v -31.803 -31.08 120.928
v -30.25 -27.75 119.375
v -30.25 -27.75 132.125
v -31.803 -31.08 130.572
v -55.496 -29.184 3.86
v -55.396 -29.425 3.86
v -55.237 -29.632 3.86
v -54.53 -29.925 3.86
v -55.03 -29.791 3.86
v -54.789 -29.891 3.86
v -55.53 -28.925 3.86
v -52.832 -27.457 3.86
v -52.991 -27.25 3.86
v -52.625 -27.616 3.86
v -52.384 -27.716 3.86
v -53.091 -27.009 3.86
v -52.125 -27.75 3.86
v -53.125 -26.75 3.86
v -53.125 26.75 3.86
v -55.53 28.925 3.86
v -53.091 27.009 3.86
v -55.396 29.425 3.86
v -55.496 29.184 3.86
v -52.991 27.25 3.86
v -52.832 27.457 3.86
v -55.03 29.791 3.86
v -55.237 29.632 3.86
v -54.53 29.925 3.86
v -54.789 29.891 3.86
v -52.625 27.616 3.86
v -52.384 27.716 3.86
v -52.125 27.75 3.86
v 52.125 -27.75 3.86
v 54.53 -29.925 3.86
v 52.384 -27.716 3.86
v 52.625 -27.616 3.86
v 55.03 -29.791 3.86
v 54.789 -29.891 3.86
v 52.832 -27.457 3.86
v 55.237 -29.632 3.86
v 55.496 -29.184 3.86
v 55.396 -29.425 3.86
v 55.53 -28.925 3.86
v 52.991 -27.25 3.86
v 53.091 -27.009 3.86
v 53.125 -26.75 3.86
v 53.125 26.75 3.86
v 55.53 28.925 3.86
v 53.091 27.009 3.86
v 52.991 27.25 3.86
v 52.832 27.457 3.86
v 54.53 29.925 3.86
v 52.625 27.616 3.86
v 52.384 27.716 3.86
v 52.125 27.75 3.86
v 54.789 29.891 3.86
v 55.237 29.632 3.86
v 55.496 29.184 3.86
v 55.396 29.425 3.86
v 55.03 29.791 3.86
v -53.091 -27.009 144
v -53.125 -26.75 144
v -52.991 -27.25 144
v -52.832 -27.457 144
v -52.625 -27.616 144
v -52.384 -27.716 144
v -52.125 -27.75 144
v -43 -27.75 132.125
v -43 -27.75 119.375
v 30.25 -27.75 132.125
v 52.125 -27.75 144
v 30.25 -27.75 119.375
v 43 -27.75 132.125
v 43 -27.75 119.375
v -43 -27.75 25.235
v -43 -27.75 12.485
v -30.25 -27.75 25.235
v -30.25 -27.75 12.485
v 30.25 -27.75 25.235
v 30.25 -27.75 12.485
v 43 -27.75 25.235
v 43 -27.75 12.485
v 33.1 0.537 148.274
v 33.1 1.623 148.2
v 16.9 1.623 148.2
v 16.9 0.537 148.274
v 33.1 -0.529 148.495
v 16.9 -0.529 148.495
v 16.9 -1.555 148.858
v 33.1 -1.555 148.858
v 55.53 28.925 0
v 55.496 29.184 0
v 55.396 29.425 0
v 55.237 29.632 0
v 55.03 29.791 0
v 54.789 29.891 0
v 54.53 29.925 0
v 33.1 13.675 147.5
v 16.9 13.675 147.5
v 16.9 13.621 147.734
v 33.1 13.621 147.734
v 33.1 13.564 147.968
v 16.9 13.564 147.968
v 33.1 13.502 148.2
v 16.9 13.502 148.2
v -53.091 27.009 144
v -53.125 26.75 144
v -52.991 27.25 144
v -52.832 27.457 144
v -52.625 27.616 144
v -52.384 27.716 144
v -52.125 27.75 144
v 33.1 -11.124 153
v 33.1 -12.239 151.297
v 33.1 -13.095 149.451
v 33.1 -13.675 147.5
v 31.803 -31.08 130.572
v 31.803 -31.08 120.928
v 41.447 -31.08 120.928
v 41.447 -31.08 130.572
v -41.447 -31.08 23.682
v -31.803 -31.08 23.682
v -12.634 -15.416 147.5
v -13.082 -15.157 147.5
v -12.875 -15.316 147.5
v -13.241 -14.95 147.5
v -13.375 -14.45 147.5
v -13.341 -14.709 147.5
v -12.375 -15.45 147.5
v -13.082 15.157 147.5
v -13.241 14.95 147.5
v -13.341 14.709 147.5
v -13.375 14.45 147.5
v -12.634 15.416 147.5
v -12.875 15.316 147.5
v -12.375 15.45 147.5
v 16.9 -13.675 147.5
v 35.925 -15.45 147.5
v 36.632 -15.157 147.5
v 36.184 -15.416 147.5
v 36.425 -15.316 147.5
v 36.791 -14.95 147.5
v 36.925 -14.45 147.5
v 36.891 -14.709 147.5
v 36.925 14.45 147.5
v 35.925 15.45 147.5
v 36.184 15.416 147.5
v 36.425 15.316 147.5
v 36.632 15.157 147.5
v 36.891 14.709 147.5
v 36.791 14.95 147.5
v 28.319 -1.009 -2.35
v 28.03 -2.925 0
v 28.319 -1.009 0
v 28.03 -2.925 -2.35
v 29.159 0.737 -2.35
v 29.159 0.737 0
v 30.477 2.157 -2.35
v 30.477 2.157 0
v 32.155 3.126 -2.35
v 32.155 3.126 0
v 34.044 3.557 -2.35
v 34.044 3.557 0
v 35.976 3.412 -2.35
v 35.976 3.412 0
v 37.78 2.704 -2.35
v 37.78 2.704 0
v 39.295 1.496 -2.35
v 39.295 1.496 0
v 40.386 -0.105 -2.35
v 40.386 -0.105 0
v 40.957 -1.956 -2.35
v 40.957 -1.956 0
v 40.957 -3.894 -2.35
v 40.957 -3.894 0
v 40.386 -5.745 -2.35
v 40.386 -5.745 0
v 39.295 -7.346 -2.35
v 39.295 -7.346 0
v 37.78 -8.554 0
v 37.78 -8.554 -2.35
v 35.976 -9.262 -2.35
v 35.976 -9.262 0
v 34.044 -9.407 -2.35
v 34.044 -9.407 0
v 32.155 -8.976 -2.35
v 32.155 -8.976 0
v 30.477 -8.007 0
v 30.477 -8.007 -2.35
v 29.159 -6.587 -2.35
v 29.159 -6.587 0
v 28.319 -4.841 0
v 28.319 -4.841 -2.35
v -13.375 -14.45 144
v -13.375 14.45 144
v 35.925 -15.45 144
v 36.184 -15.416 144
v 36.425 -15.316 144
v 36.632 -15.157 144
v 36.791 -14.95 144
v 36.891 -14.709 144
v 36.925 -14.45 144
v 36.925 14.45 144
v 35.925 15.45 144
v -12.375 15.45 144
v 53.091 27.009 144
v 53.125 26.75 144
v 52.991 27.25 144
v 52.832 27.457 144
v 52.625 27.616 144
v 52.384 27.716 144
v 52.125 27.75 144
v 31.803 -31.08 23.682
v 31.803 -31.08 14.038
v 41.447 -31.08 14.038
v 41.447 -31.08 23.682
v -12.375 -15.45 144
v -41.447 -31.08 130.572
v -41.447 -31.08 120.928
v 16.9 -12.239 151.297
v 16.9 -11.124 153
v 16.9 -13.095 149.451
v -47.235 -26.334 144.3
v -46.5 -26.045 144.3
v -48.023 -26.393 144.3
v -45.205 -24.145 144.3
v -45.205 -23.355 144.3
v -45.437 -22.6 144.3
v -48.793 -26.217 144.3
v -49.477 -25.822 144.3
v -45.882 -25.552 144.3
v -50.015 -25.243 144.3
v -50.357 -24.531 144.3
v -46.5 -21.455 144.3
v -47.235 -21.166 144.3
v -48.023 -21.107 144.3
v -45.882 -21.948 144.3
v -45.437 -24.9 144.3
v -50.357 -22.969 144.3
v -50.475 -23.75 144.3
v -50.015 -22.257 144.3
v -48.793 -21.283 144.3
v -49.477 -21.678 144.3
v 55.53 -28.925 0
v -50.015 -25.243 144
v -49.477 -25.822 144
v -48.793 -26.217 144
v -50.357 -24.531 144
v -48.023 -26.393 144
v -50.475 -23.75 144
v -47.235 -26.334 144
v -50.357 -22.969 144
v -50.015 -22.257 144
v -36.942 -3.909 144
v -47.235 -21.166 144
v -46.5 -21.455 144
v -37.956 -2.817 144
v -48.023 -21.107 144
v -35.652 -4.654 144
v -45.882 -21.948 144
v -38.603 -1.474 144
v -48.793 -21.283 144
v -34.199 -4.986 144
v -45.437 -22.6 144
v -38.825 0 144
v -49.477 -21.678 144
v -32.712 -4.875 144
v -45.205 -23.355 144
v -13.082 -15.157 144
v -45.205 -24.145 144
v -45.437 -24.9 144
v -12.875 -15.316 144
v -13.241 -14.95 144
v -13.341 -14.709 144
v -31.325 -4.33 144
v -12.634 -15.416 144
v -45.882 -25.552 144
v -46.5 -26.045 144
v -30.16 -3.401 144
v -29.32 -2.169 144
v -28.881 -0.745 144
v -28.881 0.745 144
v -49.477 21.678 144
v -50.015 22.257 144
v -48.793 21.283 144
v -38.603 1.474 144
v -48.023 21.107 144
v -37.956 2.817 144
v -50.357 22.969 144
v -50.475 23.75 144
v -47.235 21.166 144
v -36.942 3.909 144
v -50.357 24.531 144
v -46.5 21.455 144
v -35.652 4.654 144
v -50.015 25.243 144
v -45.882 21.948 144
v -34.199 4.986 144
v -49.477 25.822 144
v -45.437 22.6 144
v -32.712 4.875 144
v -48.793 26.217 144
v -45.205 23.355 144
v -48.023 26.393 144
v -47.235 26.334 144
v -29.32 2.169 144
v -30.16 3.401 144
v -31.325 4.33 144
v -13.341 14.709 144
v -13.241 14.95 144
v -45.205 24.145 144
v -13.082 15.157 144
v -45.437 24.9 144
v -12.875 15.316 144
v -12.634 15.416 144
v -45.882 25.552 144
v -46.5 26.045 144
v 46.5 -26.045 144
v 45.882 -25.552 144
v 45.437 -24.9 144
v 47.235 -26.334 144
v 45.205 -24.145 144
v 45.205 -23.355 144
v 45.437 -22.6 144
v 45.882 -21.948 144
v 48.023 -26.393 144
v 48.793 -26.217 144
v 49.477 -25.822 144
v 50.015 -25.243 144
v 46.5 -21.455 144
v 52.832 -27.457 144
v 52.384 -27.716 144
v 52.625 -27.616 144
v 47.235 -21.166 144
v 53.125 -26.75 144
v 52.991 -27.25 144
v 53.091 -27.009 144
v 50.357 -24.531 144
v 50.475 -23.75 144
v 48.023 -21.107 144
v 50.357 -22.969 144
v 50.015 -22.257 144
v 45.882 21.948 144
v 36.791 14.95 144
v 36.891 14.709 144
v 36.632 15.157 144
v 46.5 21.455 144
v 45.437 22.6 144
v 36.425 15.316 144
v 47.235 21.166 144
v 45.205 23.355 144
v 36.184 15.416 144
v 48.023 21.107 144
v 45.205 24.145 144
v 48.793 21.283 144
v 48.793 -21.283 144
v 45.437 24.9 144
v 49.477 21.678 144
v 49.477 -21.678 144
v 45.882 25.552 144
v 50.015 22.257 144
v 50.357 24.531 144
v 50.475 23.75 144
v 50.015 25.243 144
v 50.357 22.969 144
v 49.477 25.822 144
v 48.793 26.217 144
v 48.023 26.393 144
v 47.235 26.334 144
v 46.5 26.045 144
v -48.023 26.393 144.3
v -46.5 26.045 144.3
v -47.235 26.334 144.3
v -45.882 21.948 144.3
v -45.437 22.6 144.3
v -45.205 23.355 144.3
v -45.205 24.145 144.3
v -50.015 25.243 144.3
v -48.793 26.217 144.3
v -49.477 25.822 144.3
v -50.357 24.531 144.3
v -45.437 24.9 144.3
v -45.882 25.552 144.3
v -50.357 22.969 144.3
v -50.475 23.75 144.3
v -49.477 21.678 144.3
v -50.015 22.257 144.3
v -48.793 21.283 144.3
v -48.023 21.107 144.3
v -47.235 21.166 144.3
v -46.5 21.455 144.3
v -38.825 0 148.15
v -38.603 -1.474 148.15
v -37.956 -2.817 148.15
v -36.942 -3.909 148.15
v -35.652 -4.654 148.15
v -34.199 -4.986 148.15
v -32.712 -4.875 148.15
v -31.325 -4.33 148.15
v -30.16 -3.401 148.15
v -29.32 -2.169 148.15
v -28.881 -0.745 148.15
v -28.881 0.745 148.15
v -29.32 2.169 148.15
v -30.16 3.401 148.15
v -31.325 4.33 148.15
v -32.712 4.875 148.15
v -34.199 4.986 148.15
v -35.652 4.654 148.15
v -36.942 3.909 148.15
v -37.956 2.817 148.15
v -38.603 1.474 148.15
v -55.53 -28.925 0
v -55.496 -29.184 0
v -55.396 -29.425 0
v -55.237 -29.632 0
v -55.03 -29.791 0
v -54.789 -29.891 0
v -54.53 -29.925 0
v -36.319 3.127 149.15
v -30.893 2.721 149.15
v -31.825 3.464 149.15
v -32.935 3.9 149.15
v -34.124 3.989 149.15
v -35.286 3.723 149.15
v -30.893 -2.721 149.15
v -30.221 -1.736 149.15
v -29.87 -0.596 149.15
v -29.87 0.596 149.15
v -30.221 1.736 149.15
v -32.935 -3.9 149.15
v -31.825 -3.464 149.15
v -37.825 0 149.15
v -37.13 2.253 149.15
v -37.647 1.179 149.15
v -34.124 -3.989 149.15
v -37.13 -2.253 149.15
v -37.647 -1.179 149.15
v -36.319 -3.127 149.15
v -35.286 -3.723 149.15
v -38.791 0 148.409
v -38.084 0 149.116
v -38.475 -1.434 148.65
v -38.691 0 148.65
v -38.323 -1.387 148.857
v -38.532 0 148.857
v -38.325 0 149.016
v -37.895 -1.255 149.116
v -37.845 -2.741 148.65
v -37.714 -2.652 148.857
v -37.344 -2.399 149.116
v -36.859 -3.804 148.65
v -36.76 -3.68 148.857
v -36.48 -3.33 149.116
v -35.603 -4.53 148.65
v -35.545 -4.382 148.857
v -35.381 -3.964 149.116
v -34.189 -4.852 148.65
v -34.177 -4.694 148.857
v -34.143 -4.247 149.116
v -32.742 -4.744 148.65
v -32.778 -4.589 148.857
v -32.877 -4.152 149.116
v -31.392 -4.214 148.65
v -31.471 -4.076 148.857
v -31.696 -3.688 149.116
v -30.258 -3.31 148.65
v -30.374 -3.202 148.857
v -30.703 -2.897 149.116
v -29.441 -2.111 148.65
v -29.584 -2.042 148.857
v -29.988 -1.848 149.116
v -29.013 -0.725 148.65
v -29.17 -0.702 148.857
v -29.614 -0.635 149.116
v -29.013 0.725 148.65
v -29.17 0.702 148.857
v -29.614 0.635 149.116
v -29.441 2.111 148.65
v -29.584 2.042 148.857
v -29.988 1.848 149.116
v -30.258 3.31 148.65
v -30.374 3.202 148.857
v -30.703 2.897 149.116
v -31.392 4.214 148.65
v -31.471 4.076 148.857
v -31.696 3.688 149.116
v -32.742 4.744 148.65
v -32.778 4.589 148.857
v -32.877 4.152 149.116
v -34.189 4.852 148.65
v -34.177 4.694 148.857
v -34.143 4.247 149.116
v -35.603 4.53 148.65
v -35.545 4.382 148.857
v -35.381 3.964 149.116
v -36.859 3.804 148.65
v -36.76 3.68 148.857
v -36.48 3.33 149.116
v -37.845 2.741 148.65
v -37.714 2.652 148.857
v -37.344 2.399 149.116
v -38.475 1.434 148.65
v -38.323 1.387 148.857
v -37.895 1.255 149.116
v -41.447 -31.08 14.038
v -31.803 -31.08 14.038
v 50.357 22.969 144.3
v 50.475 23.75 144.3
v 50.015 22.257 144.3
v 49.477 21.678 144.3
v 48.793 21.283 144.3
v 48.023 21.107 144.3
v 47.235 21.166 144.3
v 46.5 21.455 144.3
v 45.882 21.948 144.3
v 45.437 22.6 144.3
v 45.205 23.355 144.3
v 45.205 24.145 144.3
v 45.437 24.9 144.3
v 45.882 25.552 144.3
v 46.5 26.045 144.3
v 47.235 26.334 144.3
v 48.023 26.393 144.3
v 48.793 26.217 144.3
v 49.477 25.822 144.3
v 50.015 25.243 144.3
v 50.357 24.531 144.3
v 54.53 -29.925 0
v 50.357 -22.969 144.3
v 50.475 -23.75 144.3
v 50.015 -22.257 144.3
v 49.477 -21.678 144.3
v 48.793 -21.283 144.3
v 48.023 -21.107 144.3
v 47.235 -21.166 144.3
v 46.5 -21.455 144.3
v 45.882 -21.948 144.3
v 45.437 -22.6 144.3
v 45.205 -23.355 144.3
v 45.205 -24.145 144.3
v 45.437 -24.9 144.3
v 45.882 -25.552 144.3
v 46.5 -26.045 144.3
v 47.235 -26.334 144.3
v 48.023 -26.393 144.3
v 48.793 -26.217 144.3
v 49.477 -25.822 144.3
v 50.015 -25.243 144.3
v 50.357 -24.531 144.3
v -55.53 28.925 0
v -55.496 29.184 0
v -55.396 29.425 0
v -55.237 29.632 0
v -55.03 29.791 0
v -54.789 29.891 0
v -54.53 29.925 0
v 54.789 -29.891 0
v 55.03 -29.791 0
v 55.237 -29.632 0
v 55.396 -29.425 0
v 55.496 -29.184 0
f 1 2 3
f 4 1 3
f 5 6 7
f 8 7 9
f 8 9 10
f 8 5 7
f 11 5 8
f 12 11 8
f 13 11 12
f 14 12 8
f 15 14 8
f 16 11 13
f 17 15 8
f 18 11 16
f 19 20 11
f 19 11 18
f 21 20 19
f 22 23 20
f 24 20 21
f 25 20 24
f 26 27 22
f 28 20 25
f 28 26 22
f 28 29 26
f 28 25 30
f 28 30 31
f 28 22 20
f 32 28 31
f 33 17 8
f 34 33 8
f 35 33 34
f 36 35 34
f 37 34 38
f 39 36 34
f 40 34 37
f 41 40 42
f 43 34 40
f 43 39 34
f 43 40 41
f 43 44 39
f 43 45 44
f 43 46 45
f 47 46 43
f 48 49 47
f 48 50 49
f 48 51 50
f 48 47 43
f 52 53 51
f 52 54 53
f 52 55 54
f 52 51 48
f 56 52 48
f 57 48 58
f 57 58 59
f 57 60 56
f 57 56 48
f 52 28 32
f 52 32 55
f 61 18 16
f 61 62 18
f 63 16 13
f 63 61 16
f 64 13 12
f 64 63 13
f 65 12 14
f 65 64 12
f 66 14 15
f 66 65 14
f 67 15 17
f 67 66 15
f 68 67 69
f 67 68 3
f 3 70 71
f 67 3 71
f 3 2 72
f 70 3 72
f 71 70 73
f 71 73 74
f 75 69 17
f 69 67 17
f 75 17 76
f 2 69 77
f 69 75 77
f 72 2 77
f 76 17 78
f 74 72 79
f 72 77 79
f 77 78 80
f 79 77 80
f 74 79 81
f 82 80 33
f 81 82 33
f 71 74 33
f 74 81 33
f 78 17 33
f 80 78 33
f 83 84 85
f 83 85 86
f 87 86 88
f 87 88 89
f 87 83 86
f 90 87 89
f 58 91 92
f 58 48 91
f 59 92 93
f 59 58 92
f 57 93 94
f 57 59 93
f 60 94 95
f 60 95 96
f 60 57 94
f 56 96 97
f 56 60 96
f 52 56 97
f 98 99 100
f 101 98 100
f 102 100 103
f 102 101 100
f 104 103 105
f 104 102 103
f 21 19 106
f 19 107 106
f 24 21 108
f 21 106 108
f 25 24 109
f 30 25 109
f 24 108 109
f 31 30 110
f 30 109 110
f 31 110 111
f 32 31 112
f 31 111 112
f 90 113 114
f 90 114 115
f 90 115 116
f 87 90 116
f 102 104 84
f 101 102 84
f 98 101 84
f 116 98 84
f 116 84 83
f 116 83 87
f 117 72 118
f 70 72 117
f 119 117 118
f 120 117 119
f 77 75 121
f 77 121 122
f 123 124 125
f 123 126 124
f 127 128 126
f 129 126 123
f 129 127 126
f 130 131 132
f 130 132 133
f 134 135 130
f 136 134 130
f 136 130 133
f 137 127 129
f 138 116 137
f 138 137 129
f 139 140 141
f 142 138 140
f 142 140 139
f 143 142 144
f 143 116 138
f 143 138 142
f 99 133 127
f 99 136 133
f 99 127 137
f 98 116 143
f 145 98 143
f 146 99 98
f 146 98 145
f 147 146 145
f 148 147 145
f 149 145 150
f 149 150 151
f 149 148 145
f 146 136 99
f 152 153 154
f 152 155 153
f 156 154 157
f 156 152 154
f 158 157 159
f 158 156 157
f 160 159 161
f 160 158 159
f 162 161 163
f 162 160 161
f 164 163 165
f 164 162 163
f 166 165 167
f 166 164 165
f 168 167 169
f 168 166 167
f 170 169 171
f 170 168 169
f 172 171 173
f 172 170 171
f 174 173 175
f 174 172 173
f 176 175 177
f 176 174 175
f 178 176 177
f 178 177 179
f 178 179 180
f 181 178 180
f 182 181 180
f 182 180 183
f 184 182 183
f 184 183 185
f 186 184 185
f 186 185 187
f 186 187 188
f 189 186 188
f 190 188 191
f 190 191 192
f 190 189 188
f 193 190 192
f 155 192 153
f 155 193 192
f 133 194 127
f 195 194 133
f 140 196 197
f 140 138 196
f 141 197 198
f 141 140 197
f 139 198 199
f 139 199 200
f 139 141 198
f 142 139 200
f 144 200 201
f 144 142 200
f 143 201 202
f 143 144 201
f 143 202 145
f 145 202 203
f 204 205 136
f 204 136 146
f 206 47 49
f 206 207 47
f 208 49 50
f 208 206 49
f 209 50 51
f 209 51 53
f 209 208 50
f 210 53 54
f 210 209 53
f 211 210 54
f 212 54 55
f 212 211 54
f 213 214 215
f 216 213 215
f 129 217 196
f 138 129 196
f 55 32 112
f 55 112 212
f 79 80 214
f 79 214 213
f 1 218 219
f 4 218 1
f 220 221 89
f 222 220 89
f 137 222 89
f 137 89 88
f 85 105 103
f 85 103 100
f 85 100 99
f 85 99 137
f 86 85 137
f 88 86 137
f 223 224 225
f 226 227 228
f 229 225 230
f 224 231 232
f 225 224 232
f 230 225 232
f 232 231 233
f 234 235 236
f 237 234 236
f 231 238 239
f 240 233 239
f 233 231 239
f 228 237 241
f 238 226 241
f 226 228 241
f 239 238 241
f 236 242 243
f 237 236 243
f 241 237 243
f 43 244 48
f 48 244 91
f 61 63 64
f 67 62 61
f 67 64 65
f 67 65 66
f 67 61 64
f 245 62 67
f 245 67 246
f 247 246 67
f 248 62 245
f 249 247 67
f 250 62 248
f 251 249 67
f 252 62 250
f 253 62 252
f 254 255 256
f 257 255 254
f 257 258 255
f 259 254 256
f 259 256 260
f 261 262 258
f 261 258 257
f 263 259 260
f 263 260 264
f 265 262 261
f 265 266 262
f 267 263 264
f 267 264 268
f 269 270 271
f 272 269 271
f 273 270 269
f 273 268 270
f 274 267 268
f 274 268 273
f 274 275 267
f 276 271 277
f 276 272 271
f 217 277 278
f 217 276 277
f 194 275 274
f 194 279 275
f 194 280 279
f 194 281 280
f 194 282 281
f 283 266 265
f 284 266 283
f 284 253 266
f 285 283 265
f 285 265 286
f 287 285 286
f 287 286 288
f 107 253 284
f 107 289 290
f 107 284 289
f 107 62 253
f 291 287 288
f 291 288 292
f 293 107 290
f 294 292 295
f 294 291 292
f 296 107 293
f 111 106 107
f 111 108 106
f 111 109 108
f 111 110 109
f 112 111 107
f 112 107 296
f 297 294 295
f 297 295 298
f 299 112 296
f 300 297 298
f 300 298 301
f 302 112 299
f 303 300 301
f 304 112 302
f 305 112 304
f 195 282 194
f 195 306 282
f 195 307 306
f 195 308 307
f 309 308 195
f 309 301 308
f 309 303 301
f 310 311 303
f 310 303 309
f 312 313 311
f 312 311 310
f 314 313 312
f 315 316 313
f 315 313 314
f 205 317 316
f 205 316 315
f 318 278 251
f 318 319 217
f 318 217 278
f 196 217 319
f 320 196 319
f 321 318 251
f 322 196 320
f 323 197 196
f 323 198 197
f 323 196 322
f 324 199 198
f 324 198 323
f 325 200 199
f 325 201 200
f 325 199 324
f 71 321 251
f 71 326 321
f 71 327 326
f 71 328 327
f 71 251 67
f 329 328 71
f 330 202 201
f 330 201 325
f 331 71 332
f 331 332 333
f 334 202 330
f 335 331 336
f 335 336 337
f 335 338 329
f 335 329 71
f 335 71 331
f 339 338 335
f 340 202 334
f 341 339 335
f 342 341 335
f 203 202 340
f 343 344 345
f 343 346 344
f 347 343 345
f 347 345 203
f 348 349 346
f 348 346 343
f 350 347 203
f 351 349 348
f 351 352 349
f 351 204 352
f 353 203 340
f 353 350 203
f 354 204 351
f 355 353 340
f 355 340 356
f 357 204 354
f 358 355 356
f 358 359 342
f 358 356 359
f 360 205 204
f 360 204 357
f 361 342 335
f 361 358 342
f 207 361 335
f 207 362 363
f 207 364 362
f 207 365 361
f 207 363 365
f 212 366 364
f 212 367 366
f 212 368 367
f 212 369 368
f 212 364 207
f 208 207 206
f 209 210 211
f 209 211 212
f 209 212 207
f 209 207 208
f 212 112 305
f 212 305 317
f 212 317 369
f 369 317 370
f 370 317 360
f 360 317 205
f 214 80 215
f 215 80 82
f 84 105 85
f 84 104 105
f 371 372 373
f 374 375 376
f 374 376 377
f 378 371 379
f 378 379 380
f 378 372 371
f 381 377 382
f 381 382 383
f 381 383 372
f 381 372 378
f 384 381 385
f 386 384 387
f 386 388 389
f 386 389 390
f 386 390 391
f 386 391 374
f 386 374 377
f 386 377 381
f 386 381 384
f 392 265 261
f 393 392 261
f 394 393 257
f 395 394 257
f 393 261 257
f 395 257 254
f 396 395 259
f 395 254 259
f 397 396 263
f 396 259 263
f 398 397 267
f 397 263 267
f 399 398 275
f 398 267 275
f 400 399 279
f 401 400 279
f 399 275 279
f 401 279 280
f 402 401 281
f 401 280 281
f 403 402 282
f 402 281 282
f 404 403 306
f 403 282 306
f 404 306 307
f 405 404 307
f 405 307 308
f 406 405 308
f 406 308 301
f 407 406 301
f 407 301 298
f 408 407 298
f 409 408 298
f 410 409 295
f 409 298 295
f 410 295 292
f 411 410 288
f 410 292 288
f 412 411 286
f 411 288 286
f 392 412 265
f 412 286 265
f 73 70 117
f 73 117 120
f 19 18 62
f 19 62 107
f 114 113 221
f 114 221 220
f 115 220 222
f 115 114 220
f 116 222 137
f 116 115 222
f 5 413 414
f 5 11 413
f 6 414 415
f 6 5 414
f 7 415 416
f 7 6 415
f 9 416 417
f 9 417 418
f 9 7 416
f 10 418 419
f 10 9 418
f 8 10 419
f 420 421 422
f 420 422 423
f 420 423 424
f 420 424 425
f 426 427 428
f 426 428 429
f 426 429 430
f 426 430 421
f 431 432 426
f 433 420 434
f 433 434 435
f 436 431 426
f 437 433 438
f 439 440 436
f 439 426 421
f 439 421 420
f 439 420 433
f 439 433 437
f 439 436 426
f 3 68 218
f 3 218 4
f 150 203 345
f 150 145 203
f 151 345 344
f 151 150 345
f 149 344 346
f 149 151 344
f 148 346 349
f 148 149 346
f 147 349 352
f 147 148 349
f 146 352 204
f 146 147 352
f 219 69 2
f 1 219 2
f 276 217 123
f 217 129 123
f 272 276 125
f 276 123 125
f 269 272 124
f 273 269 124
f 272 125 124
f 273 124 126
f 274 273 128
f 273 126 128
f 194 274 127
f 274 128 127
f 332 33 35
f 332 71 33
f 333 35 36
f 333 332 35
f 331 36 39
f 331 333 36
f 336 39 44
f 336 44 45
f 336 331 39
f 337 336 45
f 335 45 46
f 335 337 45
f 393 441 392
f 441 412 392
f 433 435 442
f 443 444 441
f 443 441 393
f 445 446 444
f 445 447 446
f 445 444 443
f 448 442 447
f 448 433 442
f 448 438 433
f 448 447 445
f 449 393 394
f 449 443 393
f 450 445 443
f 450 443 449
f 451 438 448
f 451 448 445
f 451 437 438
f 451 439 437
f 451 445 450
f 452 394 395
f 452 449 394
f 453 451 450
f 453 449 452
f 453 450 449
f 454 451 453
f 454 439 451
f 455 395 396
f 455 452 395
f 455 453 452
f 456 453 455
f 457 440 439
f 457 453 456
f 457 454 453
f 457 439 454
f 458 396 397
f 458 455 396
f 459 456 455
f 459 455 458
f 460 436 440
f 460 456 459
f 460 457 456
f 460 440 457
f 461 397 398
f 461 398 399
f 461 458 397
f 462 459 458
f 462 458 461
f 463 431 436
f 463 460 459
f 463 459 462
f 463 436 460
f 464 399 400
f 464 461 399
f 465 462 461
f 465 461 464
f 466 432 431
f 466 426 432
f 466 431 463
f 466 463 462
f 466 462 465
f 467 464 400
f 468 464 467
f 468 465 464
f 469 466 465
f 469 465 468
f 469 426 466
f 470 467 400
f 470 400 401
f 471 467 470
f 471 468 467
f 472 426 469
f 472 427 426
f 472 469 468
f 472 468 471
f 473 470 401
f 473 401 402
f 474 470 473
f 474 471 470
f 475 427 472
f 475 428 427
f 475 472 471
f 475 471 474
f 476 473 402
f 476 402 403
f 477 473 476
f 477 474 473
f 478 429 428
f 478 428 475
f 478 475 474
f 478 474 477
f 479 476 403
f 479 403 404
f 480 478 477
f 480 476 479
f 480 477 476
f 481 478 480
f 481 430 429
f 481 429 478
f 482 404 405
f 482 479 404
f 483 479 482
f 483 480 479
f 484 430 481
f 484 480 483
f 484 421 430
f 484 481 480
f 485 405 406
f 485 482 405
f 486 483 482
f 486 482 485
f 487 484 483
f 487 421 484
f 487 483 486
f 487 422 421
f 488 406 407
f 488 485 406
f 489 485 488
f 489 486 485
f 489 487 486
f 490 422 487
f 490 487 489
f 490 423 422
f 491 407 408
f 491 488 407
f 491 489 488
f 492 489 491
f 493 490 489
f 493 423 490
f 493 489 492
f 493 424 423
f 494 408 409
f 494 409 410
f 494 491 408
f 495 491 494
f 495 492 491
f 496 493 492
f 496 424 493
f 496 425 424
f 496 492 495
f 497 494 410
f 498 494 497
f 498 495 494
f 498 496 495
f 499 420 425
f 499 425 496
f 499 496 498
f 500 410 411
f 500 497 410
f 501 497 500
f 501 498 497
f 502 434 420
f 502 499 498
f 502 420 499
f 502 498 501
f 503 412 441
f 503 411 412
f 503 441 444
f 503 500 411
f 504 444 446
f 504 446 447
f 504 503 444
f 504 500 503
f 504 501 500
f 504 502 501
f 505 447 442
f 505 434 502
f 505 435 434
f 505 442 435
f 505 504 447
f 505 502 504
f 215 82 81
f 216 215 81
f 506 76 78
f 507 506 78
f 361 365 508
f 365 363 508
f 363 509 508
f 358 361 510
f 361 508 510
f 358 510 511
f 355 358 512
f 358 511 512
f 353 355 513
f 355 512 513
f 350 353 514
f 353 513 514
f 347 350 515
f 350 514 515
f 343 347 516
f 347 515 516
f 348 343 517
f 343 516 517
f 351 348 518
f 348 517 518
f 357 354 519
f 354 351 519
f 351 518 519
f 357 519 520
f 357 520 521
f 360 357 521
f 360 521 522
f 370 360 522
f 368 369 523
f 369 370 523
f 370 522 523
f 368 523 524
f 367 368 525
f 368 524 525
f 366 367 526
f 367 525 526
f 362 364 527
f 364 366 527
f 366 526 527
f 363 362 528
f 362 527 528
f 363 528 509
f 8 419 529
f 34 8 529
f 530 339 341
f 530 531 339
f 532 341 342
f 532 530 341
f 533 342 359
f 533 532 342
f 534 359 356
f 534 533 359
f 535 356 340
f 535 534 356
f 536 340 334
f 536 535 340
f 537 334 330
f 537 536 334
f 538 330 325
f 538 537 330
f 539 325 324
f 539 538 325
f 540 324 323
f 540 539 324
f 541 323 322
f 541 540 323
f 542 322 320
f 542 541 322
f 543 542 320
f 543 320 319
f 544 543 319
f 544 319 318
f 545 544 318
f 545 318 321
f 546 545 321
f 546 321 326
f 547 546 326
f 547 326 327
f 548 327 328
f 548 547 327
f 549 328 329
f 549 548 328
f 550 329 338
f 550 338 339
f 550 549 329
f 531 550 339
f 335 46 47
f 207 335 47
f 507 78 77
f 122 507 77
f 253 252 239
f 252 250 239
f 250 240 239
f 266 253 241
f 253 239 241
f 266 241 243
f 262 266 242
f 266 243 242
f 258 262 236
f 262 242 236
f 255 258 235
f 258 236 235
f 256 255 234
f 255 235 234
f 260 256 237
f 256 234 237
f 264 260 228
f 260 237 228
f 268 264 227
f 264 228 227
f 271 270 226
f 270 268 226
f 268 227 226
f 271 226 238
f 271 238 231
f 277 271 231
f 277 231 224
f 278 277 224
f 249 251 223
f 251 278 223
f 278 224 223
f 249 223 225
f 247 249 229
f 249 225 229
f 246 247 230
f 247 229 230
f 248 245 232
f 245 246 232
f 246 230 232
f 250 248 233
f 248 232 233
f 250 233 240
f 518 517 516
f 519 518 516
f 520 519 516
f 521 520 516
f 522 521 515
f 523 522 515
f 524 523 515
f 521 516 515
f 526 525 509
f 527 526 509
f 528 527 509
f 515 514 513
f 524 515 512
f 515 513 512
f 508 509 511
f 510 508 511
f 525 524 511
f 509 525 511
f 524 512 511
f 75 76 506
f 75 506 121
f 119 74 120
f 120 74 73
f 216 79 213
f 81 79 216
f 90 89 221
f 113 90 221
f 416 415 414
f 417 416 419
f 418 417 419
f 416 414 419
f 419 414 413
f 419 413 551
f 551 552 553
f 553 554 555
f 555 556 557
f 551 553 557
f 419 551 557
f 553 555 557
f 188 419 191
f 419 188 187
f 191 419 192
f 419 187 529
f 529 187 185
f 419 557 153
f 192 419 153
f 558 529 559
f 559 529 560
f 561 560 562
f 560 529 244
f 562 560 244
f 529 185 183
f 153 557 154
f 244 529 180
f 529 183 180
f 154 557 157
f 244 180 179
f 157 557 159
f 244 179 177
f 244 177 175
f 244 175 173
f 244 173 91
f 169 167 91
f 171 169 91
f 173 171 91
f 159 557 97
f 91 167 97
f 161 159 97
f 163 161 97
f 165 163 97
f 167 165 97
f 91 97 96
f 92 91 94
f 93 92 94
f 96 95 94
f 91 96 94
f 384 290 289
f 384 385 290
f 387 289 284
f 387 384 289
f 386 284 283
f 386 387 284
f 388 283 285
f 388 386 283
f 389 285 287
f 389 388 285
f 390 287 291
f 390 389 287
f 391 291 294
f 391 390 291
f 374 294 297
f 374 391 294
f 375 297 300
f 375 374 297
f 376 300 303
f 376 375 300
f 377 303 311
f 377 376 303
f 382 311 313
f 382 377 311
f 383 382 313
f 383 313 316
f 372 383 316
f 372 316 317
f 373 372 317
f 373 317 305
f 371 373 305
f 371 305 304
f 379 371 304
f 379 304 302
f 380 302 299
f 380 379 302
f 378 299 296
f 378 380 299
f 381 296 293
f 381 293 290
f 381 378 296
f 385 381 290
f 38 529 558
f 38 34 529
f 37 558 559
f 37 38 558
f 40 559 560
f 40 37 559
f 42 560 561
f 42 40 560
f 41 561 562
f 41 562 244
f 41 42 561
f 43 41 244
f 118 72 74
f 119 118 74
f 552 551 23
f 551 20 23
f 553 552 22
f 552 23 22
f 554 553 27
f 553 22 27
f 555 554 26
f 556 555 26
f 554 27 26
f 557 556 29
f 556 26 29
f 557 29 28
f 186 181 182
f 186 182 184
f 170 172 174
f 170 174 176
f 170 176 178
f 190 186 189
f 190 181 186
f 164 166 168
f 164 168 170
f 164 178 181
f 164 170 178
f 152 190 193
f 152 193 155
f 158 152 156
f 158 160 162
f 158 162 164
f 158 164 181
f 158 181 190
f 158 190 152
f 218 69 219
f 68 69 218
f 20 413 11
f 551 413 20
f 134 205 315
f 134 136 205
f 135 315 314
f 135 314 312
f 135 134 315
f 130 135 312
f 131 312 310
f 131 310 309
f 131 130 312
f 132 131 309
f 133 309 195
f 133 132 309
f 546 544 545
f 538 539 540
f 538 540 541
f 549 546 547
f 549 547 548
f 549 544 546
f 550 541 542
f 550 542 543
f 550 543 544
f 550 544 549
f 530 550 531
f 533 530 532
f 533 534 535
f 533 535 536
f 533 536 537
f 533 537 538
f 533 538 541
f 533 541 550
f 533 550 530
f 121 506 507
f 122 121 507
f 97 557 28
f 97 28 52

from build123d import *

# Parameters (mm, degrees)
SKETCH1_W               = 111.06
SKETCH1_H               = 59.85
FACE_2_DEPTH            = 3.86
FACE_FILLETS_R          = 1
SKETCH2_W               = 106.25
SKETCH2_H               = 55.5
BODY_DEPTH              = 144
SKETCH3_W               = 12.75
SKETCH3_H               = 12.75
FEET_DEPTH              = 3.33
FEET_DRAFT              = 25
FEET_PROFILE_2_DEPTH    = 3.33
FEET_PROFILE_2_DRAFT    = 25
FEET_PROFILE_3_DEPTH    = 3.33
FEET_PROFILE_3_DRAFT    = 25
FEET_PROFILE_4_DEPTH    = 3.33
FEET_PROFILE_4_DRAFT    = 25
BODY_FILLETS_R          = 1
SKETCH4_R               = 5
GND_BANNANA_PORT_DEPTH  = 5.15
FILLET3_R               = 1
SKETCH5_W               = 50.3
SKETCH5_H               = 30.9
POWER_PORT_DEPTH        = 3.5
FILLET4_R               = 1
BOSS_EXTRUDE6_DEPTH     = 8.1
SKETCH7_R               = 6.5
BOSS_EXTRUDE7_DEPTH     = 2.35
SKETCH8_R               = 2.65
BOSS_EXTRUDE8_DEPTH     = 0.3
MIRROR2_COPY_1_SKETCH_R = 2.65
MIRROR2_COPY_1_DEPTH    = 0.3


with BuildPart() as part:
    # Sketch1 → Face 2 (new body)
    with BuildSketch(Plane.XY):
        Rectangle(SKETCH1_W, SKETCH1_H)
    extrude(amount=FACE_2_DEPTH)

    # Face Fillets
    face_fillets_edges = [part.edges().sort_by_distance(p)[0] for p in [
        (55.53, -29.925, 1.93),
        (-55.53, -29.925, 1.93),
        (-55.53, 29.925, 1.93),
        (55.53, 29.925, 1.93),
    ]]
    fillet(face_fillets_edges, radius=FACE_FILLETS_R)

    # Sketch2 → Body (add)
    with BuildSketch(Plane.XY):
        Rectangle(SKETCH2_W, SKETCH2_H)
    extrude(amount=BODY_DEPTH)


with BuildPart() as feet_tool:
    # Sketch3 → Feet (with draft: the straight prism first)
    with BuildSketch(Plane.XZ.offset(27.75)):
        with Locations((-36.625, 125.75)):
            Rectangle(SKETCH3_W, SKETCH3_H)
    extrude(amount=FEET_DEPTH)
    # Feet: the draft: its side faces are tilted about the plane it starts from
    feet_sides = [feet_tool.faces().sort_by_distance(p)[0] for p in [
        (-36.625, -29.415, 119.375),
        (-30.25, -29.415, 125.75),
        (-36.625, -29.415, 132.125),
        (-43, -29.415, 125.75),
    ]]
    draft(feet_sides, Plane.XZ.offset(27.75), FEET_DRAFT)


with BuildPart() as part_1:
    add(part.part)

    # Feet: add feet_tool
    add(feet_tool.part)


with BuildPart() as feet_profile_2_tool:
    # Sketch3 → Feet profile 2 (with draft: the straight prism first)
    with BuildSketch(Plane.XZ.offset(27.75)):
        with Locations((36.625, 125.75)):
            Rectangle(SKETCH3_W, SKETCH3_H)
    extrude(amount=FEET_PROFILE_2_DEPTH)
    # Feet profile 2: the draft: its side faces are tilted about the plane it starts from
    feet_profile_2_sides = [feet_profile_2_tool.faces().sort_by_distance(p)[0] for p in [
        (36.625, -29.415, 119.375),
        (43, -29.415, 125.75),
        (36.625, -29.415, 132.125),
        (30.25, -29.415, 125.75),
    ]]
    draft(feet_profile_2_sides, Plane.XZ.offset(27.75), FEET_PROFILE_2_DRAFT)


with BuildPart() as part_2:
    add(part_1.part)

    # Feet profile 2: add feet_profile_2_tool
    add(feet_profile_2_tool.part)


with BuildPart() as feet_profile_3_tool:
    # Sketch3 → Feet profile 3 (with draft: the straight prism first)
    with BuildSketch(Plane.XZ.offset(27.75)):
        with Locations((36.625, 18.86)):
            Rectangle(SKETCH3_W, SKETCH3_H)
    extrude(amount=FEET_PROFILE_3_DEPTH)
    # Feet profile 3: the draft: its side faces are tilted about the plane it starts from
    feet_profile_3_sides = [feet_profile_3_tool.faces().sort_by_distance(p)[0] for p in [
        (36.625, -29.415, 12.485),
        (43, -29.415, 18.86),
        (36.625, -29.415, 25.235),
        (30.25, -29.415, 18.86),
    ]]
    draft(feet_profile_3_sides, Plane.XZ.offset(27.75), FEET_PROFILE_3_DRAFT)


with BuildPart() as part_3:
    add(part_2.part)

    # Feet profile 3: add feet_profile_3_tool
    add(feet_profile_3_tool.part)


with BuildPart() as feet_profile_4_tool:
    # Sketch3 → Feet profile 4 (with draft: the straight prism first)
    with BuildSketch(Plane.XZ.offset(27.75)):
        with Locations((-36.625, 18.86)):
            Rectangle(SKETCH3_W, SKETCH3_H)
    extrude(amount=FEET_PROFILE_4_DEPTH)
    # Feet profile 4: the draft: its side faces are tilted about the plane it starts from
    feet_profile_4_sides = [feet_profile_4_tool.faces().sort_by_distance(p)[0] for p in [
        (-36.625, -29.415, 12.485),
        (-30.25, -29.415, 18.86),
        (-36.625, -29.415, 25.235),
        (-43, -29.415, 18.86),
    ]]
    draft(feet_profile_4_sides, Plane.XZ.offset(27.75), FEET_PROFILE_4_DRAFT)


with BuildPart() as part_4:
    add(part_3.part)

    # Feet profile 4: add feet_profile_4_tool
    add(feet_profile_4_tool.part)

    # Body Fillets
    body_fillets_edges = [part_4.edges().sort_by_distance(p)[0] for p in [
        (53.125, -27.75, 73.93),
        (53.125, 27.75, 73.93),
        (-53.125, 27.75, 73.93),
        (-53.125, -27.75, 73.93),
    ]]
    fillet(body_fillets_edges, radius=BODY_FILLETS_R)

    # Sketch4 → GND Bannana Port (add)
    with BuildSketch(Plane.XY.offset(144)):
        with Locations(Location((-33.825, 0, 0), (0, 0, 180))):
            Circle(SKETCH4_R)
    extrude(amount=GND_BANNANA_PORT_DEPTH)

    # Fillet3
    fillet3_edges = [part_4.edges().sort_by_distance(p)[0] for p in [
        (-28.825, 0, 149.15),
    ]]
    fillet(fillet3_edges, radius=FILLET3_R)

    # Sketch5 → Power Port (add)
    with BuildSketch(Plane.XY.offset(144)):
        with Locations((11.775, 0)):
            Rectangle(SKETCH5_W, SKETCH5_H)
    extrude(amount=POWER_PORT_DEPTH)

    # Fillet4
    fillet4_edges = [part_4.edges().sort_by_distance(p)[0] for p in [
        (36.925, -15.45, 145.75),
        (36.925, 15.45, 145.75),
        (-13.375, 15.45, 145.75),
        (-13.375, -15.45, 145.75),
    ]]
    fillet(fillet4_edges, radius=FILLET4_R)

    # Sketch6 → Boss-Extrude6 (add, symmetric)
    with BuildSketch(Plane(origin=(25, 0, 0), x_dir=(0, 0, -1), z_dir=(1, 0, 0))):
        with BuildLine():
            Line((-148.2, 13.502222039), (-148.2, 1.62259302))
            ThreePointArc((-148.2, 1.62259302), (-148.366278541, 0), (-148.858202027, -1.55514242))
            Line((-148.858202027, -1.55514242), (-153, -11.124297731))
            ThreePointArc((-153, -11.124297731), (-130.758589265, -2.678363494), (-148.2, 13.502222039))
        make_face()
    extrude(amount=BOSS_EXTRUDE6_DEPTH, both=True)

    # Sketch7 → Boss-Extrude7 (add, symmetric)
    with BuildSketch(Plane(origin=(0, 0, 0), x_dir=(-1, 0, 0), z_dir=(0, 0, -1))):
        with Locations((-34.53, -2.925)):
            Circle(SKETCH7_R)
    extrude(amount=BOSS_EXTRUDE7_DEPTH, both=True)

    # Sketch8 → Boss-Extrude8 (add, symmetric)
    with BuildSketch(Plane.XY.offset(144)):
        with Locations(Location((-47.825, 23.75, 0), (0, 0, 180))):
            Circle(SKETCH8_R)
    boss_extrude8 = extrude(amount=BOSS_EXTRUDE8_DEPTH, both=True)

    # Mirror1: Boss-Extrude8 across plane
    add(boss_extrude8.mirror(Plane(origin=(0, 0, 0), x_dir=(0, 0, 1), z_dir=(1, 0, 0))))

    # Mirror2: Boss-Extrude8 across plane
    add(boss_extrude8.mirror(Plane.ZX))

    # Mirror2 copy 1 sketch → Mirror2 copy 1 (add, symmetric)
    with BuildSketch(Plane(origin=(0, 0, 144), x_dir=(-1, 0, 0), z_dir=(0, 0, 1))):
        with Locations(Location((-47.825, 23.75, 0), (0, 0, 180))):
            Circle(MIRROR2_COPY_1_SKETCH_R)
    extrude(amount=MIRROR2_COPY_1_DEPTH, both=True)


solid = part_4.part
